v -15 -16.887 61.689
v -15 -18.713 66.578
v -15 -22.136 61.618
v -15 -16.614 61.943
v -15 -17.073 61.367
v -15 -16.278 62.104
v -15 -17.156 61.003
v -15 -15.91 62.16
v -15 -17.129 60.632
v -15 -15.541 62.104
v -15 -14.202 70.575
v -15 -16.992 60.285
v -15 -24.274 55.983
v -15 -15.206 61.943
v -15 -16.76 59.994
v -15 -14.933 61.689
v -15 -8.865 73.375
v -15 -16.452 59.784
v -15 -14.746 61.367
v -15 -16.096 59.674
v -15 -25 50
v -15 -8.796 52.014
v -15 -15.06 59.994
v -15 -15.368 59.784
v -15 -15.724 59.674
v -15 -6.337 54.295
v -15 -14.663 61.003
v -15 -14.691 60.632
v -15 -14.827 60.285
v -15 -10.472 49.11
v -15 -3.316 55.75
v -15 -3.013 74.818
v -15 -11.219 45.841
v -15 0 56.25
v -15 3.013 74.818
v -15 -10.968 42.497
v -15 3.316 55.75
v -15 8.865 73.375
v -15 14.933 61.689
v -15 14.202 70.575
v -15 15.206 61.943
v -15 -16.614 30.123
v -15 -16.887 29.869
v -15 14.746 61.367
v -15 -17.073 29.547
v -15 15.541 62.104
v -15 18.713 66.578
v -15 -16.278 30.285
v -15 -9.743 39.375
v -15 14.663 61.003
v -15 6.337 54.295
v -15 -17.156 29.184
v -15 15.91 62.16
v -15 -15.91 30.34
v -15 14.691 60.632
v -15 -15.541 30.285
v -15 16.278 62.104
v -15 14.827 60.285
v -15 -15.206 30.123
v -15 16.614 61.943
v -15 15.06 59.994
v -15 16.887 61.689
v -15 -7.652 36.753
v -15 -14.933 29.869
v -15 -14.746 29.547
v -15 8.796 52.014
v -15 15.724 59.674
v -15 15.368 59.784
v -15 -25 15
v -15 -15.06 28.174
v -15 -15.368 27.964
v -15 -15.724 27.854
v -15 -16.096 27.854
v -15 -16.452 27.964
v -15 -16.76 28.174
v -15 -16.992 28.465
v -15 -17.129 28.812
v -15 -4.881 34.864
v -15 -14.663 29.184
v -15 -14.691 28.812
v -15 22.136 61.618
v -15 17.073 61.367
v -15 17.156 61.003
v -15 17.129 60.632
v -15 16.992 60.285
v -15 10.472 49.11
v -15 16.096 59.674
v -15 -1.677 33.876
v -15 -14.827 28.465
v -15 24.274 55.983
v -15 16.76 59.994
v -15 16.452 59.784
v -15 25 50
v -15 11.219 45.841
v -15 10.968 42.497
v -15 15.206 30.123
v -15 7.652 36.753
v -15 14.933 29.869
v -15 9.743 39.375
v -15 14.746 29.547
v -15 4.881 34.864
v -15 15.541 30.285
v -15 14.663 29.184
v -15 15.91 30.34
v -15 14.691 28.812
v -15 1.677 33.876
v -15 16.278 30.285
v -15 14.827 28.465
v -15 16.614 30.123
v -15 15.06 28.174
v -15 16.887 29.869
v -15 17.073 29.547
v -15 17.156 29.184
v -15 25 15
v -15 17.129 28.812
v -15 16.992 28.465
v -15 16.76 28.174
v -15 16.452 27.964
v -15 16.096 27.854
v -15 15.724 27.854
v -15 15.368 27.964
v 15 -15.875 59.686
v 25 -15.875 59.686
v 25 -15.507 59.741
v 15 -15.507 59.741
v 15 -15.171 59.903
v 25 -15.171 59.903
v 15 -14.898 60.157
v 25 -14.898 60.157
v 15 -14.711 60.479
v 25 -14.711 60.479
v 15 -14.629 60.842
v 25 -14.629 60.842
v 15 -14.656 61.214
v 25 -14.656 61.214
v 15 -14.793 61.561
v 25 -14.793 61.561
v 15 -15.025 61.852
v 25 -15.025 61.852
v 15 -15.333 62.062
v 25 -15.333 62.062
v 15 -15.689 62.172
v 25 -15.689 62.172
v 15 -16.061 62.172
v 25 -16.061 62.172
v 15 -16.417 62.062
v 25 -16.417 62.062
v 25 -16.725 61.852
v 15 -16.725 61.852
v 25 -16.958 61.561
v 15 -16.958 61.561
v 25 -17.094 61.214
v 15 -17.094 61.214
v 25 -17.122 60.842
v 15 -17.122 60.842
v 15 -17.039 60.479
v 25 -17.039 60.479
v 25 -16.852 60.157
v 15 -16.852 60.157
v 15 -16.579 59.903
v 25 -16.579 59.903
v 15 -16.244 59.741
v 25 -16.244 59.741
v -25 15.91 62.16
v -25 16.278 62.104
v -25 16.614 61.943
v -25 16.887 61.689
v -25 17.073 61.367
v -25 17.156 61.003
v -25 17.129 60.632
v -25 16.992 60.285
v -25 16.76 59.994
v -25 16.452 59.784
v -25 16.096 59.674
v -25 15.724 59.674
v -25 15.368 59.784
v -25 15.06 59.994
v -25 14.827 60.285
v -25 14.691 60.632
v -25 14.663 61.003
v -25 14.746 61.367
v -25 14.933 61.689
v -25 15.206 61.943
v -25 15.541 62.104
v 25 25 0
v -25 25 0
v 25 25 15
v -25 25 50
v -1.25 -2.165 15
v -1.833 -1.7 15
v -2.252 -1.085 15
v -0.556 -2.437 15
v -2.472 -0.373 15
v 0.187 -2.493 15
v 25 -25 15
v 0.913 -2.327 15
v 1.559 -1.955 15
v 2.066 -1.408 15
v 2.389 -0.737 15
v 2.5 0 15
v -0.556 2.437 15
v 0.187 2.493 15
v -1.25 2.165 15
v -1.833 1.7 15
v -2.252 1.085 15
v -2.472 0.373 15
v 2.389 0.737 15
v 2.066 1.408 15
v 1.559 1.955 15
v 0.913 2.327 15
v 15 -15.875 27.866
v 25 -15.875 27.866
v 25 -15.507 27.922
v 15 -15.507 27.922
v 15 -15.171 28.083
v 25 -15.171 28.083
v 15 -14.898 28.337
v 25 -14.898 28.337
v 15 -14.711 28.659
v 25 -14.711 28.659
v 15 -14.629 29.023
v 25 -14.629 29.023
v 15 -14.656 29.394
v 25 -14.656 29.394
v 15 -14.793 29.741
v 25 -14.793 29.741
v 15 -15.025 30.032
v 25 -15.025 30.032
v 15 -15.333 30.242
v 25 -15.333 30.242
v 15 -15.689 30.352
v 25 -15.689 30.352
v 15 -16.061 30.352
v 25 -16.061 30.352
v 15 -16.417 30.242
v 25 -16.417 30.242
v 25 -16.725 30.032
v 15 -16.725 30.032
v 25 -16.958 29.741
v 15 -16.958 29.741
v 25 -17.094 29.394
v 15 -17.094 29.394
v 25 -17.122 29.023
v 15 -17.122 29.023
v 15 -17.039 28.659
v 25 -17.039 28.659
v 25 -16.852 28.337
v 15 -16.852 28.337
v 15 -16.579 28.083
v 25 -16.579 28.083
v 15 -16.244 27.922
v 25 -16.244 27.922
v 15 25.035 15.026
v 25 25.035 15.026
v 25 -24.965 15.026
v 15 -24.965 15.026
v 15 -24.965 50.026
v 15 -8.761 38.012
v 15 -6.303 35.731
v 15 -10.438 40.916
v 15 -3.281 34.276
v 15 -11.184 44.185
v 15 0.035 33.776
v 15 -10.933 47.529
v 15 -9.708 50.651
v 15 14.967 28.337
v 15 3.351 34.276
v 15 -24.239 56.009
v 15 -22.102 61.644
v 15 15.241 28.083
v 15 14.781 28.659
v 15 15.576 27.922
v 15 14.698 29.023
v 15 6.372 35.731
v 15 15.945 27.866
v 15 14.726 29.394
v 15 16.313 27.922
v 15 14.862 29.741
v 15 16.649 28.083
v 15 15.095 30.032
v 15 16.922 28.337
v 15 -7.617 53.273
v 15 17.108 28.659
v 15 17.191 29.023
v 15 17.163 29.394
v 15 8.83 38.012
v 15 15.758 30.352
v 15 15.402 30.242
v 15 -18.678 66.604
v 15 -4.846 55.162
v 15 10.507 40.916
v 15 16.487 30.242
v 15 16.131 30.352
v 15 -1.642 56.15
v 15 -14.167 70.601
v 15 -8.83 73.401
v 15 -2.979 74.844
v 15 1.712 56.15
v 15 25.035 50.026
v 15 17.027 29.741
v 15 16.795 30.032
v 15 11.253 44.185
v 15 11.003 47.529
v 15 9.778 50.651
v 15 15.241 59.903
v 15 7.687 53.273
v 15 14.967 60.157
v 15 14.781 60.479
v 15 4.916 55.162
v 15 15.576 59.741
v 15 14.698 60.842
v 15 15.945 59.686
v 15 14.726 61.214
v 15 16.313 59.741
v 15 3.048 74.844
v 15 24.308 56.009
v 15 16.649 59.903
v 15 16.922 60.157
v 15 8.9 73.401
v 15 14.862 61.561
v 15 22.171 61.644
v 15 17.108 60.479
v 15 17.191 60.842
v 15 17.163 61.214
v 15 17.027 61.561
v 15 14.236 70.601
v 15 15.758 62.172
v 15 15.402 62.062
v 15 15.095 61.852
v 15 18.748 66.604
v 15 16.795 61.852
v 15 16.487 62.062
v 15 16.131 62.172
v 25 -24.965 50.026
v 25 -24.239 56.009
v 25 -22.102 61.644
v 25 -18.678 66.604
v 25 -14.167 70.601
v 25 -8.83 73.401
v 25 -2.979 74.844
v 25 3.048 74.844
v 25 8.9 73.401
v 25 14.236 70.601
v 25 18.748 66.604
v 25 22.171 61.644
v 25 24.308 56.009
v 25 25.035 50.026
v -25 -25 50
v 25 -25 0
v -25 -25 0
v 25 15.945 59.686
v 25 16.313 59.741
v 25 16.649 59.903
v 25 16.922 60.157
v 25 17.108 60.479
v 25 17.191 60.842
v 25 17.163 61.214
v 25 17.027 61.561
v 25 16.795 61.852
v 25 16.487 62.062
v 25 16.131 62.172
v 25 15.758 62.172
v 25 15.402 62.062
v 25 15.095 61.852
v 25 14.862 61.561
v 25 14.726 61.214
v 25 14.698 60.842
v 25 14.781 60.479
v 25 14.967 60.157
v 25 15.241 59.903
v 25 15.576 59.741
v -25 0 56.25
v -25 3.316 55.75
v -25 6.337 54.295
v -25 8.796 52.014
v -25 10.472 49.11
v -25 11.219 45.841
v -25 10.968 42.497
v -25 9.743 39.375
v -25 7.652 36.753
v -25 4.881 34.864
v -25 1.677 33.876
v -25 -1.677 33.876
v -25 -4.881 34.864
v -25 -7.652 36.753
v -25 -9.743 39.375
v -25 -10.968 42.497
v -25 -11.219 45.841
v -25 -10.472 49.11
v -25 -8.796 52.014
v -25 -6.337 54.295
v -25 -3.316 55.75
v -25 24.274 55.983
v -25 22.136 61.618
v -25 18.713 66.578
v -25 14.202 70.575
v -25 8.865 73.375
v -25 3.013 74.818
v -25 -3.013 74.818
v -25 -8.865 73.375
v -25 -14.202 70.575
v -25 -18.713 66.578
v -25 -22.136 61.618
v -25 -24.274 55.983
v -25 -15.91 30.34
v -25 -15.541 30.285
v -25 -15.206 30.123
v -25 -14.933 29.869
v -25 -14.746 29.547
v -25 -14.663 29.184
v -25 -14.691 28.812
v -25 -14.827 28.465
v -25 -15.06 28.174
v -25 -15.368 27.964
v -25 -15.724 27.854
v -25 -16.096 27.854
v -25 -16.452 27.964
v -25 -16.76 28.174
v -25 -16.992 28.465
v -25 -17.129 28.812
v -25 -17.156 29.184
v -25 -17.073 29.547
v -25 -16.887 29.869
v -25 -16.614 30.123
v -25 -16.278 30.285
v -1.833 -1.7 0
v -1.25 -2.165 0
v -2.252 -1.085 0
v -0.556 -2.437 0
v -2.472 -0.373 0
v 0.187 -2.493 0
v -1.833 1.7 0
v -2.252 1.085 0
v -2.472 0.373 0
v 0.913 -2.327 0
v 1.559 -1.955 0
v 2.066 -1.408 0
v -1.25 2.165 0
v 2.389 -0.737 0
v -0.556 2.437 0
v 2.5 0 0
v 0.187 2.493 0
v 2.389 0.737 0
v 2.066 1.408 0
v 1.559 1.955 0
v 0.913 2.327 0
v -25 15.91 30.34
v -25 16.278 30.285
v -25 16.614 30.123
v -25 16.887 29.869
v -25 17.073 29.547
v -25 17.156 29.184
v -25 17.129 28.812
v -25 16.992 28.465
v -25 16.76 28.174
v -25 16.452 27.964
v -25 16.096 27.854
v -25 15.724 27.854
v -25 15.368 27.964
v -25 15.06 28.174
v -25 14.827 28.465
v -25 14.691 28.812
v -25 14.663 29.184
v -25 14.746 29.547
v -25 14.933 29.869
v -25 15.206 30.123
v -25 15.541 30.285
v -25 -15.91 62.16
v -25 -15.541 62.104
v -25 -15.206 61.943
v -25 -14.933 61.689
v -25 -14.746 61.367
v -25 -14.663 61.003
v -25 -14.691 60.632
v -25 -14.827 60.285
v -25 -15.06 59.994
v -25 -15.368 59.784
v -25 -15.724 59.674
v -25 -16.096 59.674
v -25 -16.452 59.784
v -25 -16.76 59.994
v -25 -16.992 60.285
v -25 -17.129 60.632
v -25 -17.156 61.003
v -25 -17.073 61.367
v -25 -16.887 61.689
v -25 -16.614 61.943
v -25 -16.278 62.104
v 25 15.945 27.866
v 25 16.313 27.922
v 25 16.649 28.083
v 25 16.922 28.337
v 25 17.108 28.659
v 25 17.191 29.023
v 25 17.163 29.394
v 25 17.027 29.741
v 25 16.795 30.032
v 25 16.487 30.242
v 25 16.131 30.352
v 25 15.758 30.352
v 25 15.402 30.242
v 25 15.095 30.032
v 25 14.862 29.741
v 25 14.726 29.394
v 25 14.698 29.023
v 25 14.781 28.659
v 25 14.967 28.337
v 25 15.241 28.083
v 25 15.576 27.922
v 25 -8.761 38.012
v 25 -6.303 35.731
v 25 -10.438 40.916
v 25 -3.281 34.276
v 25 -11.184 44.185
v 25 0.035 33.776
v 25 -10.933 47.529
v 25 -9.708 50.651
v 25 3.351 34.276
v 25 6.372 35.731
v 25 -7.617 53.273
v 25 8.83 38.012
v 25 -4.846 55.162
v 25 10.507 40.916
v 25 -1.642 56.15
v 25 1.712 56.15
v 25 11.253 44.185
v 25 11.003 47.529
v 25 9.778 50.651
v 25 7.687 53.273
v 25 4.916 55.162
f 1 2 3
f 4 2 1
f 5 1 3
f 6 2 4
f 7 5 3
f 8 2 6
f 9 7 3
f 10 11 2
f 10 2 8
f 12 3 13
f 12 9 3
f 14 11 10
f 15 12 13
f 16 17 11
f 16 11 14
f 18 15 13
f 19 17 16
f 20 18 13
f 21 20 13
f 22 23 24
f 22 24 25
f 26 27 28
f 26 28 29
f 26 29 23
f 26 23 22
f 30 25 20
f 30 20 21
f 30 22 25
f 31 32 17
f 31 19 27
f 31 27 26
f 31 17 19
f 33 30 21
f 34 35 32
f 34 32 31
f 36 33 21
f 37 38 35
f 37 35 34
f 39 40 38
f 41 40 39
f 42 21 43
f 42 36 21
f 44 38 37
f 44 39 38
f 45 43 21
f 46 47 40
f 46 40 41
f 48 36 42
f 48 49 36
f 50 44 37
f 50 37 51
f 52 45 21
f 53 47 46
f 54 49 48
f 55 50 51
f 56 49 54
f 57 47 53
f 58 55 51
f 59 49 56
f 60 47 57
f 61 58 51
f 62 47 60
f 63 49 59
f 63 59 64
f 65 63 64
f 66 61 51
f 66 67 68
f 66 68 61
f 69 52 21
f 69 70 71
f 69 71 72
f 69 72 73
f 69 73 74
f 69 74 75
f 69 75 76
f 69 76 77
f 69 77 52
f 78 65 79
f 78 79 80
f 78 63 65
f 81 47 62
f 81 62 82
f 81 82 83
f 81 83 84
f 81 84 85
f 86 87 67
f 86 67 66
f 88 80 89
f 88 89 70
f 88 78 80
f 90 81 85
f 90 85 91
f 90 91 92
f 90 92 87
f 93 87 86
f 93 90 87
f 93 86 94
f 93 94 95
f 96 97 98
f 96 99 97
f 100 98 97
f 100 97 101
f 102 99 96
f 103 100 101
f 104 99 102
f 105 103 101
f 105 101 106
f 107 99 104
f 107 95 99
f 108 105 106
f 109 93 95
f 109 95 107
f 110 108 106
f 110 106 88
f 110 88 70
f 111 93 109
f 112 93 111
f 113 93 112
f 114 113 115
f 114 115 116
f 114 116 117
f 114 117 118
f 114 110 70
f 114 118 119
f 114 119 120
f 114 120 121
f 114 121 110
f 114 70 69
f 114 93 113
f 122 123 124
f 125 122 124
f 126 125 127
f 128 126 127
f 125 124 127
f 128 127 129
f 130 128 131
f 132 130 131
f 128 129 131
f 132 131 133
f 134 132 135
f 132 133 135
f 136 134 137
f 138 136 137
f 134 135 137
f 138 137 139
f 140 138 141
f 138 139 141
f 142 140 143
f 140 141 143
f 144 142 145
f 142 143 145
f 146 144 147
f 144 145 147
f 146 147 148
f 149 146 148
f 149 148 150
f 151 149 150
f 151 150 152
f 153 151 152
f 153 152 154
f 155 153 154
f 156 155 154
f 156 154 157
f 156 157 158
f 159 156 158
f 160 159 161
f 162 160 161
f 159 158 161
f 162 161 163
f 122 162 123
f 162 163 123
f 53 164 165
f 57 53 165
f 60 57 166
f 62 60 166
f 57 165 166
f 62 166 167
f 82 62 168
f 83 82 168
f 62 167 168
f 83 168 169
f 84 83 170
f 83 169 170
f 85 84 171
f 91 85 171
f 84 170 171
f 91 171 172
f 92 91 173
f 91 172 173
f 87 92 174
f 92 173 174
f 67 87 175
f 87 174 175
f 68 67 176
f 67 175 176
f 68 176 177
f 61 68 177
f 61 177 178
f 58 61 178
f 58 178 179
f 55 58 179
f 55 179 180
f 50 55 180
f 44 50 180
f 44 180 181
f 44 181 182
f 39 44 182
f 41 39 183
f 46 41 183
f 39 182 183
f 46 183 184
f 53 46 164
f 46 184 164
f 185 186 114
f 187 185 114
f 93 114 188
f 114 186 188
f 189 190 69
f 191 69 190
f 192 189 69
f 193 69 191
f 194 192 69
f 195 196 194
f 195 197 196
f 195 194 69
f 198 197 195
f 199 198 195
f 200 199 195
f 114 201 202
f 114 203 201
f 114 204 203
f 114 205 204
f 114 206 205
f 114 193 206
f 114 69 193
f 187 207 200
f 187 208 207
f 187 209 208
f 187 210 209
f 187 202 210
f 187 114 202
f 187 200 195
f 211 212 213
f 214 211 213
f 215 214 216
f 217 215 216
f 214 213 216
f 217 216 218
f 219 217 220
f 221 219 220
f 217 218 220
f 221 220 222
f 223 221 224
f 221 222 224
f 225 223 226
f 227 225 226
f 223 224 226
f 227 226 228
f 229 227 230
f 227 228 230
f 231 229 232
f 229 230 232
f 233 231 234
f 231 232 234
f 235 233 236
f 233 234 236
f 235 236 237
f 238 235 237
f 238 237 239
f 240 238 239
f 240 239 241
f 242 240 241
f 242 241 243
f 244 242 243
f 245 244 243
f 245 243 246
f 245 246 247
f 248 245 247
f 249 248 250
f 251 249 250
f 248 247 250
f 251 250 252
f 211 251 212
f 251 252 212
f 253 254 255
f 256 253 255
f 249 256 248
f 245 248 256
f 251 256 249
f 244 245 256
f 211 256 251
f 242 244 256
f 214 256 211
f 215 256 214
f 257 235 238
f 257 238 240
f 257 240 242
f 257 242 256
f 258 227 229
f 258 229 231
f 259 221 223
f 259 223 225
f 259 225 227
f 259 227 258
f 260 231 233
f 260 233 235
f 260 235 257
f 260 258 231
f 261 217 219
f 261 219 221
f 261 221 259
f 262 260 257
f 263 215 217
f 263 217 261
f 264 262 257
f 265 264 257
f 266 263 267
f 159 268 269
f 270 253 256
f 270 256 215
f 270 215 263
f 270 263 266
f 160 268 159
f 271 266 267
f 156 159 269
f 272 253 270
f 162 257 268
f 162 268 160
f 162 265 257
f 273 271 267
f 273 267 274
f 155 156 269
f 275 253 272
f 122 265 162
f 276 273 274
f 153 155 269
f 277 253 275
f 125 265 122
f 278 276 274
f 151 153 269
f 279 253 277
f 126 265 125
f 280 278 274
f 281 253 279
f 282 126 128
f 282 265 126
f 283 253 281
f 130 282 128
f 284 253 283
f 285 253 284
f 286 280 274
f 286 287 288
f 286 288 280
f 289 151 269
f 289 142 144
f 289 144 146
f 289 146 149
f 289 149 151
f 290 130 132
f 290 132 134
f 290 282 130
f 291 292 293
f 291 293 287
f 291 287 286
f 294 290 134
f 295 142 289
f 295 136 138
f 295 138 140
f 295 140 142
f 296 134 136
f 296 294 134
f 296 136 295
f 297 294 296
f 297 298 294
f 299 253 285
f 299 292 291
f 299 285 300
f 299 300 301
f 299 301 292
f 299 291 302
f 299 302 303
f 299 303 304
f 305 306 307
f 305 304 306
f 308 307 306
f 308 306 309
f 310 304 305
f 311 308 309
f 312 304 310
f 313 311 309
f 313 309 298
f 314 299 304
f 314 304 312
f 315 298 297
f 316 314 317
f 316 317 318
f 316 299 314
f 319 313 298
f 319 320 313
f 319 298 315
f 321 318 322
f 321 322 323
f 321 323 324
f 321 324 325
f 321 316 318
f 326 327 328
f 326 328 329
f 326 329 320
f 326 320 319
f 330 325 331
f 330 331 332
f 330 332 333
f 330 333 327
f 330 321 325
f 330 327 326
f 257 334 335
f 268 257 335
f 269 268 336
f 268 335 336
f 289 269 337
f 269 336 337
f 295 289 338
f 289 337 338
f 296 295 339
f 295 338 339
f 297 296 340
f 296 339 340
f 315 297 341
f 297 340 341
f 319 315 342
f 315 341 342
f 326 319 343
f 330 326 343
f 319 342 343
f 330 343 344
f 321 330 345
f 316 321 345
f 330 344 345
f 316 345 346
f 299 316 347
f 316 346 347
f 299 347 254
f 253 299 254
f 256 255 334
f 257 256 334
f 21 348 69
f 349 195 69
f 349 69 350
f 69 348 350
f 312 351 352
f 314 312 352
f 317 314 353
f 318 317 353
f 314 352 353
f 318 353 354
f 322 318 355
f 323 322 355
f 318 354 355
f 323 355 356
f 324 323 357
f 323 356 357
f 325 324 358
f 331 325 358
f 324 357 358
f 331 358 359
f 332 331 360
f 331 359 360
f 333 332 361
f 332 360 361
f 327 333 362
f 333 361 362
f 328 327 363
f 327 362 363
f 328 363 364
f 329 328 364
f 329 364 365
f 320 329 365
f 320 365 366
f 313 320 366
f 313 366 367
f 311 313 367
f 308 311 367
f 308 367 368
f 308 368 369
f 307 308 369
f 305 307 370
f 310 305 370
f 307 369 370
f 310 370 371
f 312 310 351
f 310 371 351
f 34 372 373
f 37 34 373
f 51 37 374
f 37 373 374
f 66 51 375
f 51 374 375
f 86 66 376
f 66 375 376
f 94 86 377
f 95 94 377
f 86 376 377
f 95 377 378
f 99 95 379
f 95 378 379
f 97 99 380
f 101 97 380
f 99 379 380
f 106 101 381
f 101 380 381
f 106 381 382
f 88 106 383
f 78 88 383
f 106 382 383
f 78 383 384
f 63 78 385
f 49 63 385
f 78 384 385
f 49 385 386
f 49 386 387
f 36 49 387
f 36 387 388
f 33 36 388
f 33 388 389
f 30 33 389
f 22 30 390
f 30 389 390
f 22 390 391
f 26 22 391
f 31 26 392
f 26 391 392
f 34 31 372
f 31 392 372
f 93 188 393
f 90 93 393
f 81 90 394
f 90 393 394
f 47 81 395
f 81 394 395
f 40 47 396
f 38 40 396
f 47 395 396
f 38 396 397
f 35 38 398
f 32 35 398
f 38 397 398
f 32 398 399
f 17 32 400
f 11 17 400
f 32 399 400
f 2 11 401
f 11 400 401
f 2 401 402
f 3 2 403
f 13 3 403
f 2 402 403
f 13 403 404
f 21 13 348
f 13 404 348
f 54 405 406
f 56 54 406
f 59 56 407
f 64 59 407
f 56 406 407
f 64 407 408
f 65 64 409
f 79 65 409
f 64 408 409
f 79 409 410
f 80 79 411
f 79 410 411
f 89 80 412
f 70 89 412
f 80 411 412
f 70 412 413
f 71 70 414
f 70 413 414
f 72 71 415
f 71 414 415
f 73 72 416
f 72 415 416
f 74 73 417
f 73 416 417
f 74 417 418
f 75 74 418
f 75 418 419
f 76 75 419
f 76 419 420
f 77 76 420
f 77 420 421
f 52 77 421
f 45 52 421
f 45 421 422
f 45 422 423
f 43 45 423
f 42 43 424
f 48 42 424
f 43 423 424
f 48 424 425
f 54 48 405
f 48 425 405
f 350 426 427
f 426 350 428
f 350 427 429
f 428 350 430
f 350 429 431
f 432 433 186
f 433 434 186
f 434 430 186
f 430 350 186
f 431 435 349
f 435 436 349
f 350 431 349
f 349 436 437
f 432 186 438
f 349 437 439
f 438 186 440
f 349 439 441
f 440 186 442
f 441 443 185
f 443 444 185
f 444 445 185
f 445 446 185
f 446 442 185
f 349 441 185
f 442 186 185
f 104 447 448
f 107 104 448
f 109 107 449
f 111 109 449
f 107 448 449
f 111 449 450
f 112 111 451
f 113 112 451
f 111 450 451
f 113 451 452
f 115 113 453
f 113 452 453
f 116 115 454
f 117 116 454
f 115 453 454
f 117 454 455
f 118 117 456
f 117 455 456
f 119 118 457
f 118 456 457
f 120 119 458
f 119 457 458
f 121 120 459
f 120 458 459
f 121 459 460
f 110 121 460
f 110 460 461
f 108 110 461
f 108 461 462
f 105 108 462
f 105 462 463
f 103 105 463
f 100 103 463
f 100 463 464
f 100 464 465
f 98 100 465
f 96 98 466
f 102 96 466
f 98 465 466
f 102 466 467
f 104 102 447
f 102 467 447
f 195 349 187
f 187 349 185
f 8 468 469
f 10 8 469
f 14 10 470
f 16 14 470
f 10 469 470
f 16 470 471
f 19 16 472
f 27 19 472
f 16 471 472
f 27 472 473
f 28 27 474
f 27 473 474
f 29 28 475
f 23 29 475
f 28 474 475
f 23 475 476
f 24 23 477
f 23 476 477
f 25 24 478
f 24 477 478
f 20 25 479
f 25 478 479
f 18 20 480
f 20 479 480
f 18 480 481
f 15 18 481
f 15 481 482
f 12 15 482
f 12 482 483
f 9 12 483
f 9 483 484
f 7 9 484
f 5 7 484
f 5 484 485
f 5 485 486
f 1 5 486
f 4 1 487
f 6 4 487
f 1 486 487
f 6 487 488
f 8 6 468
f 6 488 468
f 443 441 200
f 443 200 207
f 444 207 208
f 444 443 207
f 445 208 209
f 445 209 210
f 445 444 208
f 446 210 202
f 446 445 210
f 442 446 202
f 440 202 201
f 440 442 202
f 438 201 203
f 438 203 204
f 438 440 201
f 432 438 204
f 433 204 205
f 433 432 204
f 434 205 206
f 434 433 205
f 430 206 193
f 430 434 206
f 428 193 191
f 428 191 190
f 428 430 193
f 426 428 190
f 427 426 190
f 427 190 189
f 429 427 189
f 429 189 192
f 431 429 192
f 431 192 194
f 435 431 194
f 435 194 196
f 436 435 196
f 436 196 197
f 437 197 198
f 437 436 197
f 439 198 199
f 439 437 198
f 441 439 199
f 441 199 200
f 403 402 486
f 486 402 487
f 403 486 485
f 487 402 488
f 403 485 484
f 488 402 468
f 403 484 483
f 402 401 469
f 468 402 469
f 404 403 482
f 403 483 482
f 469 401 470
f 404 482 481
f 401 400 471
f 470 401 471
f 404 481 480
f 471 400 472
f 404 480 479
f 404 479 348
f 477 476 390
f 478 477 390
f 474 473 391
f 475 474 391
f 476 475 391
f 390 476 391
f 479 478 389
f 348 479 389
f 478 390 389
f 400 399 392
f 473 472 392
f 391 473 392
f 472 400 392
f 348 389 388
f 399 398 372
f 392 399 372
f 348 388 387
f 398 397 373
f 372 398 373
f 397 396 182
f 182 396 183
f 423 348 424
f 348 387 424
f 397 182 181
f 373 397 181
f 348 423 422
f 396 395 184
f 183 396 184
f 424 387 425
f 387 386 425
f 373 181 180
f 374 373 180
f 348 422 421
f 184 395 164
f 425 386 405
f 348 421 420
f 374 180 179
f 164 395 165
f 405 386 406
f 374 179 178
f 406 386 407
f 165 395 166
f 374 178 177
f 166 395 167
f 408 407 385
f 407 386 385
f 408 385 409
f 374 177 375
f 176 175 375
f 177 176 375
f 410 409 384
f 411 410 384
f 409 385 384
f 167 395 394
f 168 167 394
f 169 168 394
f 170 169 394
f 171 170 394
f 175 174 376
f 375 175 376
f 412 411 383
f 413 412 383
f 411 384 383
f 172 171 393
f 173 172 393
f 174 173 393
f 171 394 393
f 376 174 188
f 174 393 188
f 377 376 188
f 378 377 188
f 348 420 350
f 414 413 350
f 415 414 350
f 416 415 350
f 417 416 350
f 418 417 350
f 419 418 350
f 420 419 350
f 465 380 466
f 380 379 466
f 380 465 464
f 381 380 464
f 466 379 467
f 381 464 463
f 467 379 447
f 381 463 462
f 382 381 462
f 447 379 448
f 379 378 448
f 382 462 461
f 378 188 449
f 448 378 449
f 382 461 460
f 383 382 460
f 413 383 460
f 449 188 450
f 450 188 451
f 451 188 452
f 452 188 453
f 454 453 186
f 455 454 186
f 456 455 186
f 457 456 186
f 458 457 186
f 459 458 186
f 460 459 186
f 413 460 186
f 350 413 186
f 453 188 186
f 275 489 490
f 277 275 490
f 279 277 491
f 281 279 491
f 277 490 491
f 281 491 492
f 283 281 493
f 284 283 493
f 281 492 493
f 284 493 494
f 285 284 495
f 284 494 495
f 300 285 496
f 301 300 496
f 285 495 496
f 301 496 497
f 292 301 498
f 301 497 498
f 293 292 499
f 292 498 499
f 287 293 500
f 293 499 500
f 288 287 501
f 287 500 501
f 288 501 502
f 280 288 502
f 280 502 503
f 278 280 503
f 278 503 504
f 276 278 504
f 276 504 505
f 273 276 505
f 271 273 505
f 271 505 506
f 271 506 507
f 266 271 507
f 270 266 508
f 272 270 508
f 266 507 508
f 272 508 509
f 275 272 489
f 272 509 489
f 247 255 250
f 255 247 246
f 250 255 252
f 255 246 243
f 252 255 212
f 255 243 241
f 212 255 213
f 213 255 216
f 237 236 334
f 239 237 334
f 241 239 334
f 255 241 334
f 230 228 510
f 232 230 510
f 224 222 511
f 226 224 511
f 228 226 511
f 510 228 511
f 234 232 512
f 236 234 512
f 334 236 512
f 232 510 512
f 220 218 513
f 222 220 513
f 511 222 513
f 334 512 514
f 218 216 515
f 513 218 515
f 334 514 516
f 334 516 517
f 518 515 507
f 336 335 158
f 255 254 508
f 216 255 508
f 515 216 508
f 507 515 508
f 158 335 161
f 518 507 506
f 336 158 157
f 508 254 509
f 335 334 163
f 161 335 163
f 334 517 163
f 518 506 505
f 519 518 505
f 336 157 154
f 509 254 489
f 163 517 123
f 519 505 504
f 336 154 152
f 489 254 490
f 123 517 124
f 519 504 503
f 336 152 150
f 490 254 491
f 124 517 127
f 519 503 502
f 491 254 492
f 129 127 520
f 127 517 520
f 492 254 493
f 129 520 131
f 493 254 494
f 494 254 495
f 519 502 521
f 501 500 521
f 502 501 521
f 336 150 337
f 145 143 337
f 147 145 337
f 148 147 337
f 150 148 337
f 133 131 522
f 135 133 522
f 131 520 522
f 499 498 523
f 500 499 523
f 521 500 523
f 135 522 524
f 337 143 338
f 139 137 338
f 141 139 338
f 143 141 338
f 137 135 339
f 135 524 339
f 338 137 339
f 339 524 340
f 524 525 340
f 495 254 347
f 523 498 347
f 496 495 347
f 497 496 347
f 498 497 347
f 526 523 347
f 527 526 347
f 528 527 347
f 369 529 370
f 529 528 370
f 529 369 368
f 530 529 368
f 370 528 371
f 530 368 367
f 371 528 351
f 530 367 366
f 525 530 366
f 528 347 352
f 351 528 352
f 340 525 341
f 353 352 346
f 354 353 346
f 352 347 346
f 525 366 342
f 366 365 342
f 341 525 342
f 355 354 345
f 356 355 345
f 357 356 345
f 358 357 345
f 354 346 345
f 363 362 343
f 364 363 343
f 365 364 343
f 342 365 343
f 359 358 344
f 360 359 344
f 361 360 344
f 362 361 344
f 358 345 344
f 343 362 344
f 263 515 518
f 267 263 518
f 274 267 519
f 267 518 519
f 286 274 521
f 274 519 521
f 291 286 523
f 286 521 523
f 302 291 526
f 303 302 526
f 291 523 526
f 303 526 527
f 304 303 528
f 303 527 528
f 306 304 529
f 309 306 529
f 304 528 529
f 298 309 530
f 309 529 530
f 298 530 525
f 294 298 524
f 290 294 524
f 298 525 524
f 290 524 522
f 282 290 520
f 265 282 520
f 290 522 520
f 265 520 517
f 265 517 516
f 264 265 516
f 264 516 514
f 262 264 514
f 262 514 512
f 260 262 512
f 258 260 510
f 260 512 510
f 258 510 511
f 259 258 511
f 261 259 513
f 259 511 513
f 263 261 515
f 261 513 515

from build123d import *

# Parameters (mm, degrees)
CROQUIS1_W              = 50
CROQUIS1_H              = 50
CROQUIS1_R              = 2.5
SALIENTE_EXTRUIR1_DEPTH = 15
CROQUIS2_R              = 11.25
CROQUIS2_R_2            = 1.25
SALIENTE_EXTRUIR2_DEPTH = 10
SALIENTE_EXTRUIR3_DEPTH = 10


with BuildPart() as part:
    # Croquis1 → Saliente-Extruir1 (new body)
    with BuildSketch(Plane.XY):
        Rectangle(CROQUIS1_W, CROQUIS1_H)
        Circle(CROQUIS1_R, mode=Mode.SUBTRACT)
    extrude(amount=SALIENTE_EXTRUIR1_DEPTH)

    # Croquis2 → Saliente-Extruir2 (add)
    with BuildSketch(Plane.ZY.offset(25)):
        with BuildLine():
            Line((15, 25), (50, 25))
            ThreePointArc((50, 25), (75, 0), (50, -25))
            Line((50, -25), (15, -25))
            Line((15, -25), (15, 25))
        make_face()
        with Locations((45, 0)):
            Circle(CROQUIS2_R, mode=Mode.SUBTRACT)
        with Locations((60.909902577, -15.909902577)):
            Circle(CROQUIS2_R_2, mode=Mode.SUBTRACT)
        with Locations((60.909902577, 15.909902577)):
            Circle(CROQUIS2_R_2, mode=Mode.SUBTRACT)
        with Locations((29.090097423, 15.909902577)):
            Circle(CROQUIS2_R_2, mode=Mode.SUBTRACT)
        with Locations((29.090097423, -15.909902577)):
            Circle(CROQUIS2_R_2, mode=Mode.SUBTRACT)
    extrude(amount=-SALIENTE_EXTRUIR2_DEPTH)


with BuildPart() as body_2:
    # Croquis4 → Saliente-Extruir3 (new body)
    with BuildSketch(Plane(origin=(25, 0, 0), x_dir=(0, 0, -1), z_dir=(1, 0, 0))):
        with BuildLine():
            Line((-15.025995747, -24.965180979), (-15.025995747, 25.034819021))
            Line((-15.025995747, 25.034819021), (-50.025995747, 25.034819021))
            ThreePointArc((-50.025995747, 25.034819021), (-75.025995747, 0.034819021), (-50.025995747, -24.965180979))
            Line((-50.025995747, -24.965180979), (-15.025995747, -24.965180979))
        make_face()
        with BuildLine():
            ThreePointArc((-59.685898324, -15.875083556), (-62.090747739, -16.353437847), (-60.052014847, -14.99120008))
            ThreePointArc((-60.052014847, -14.99120008), (-59.781048908, -15.396729266), (-59.685898324, -15.875083556))
        make_face(mode=Mode.SUBTRACT)
        with BuildLine():
            ThreePointArc((-27.86609317, -15.875083556), (-29.594447461, -17.029932972), (-29.999976647, -14.99120008))
            ThreePointArc((-29.999976647, -14.99120008), (-28.63773888, -14.72023414), (-27.86609317, -15.875083556))
        make_face(mode=Mode.SUBTRACT)
        with BuildLine():
            ThreePointArc((-59.685898324, 15.944721597), (-59.781048908, 15.466367307), (-60.052014847, 15.060838121))
            ThreePointArc((-60.052014847, 15.060838121), (-62.090747739, 16.423075888), (-59.685898324, 15.944721597))
        make_face(mode=Mode.SUBTRACT)
        with BuildLine():
            ThreePointArc((-33.775995747, 0.034819021), (-34.632351006, -4.270369594), (-37.071044459, -7.920132268))
            ThreePointArc((-37.071044459, -7.920132268), (-45.025995747, -11.215180979), (-52.980947035, -7.920132268))
            ThreePointArc((-52.980947035, -7.920132268), (-56.275995747, 0.034819021), (-52.980947035, 7.989770309))
            ThreePointArc((-52.980947035, 7.989770309), (-45.025995747, 11.284819021), (-37.071044459, 7.989770309))
            ThreePointArc((-37.071044459, 7.989770309), (-34.632351006, 4.340007635), (-33.775995747, 0.034819021))
        make_face(mode=Mode.SUBTRACT)
        with BuildLine():
            ThreePointArc((-27.86609317, 15.944721597), (-28.63773888, 14.789872182), (-29.999976647, 15.060838121))
            ThreePointArc((-29.999976647, 15.060838121), (-29.594447461, 17.099571013), (-27.86609317, 15.944721597))
        make_face(mode=Mode.SUBTRACT)
    extrude(amount=-SALIENTE_EXTRUIR3_DEPTH)


solid = Compound([part.part, body_2.part])
